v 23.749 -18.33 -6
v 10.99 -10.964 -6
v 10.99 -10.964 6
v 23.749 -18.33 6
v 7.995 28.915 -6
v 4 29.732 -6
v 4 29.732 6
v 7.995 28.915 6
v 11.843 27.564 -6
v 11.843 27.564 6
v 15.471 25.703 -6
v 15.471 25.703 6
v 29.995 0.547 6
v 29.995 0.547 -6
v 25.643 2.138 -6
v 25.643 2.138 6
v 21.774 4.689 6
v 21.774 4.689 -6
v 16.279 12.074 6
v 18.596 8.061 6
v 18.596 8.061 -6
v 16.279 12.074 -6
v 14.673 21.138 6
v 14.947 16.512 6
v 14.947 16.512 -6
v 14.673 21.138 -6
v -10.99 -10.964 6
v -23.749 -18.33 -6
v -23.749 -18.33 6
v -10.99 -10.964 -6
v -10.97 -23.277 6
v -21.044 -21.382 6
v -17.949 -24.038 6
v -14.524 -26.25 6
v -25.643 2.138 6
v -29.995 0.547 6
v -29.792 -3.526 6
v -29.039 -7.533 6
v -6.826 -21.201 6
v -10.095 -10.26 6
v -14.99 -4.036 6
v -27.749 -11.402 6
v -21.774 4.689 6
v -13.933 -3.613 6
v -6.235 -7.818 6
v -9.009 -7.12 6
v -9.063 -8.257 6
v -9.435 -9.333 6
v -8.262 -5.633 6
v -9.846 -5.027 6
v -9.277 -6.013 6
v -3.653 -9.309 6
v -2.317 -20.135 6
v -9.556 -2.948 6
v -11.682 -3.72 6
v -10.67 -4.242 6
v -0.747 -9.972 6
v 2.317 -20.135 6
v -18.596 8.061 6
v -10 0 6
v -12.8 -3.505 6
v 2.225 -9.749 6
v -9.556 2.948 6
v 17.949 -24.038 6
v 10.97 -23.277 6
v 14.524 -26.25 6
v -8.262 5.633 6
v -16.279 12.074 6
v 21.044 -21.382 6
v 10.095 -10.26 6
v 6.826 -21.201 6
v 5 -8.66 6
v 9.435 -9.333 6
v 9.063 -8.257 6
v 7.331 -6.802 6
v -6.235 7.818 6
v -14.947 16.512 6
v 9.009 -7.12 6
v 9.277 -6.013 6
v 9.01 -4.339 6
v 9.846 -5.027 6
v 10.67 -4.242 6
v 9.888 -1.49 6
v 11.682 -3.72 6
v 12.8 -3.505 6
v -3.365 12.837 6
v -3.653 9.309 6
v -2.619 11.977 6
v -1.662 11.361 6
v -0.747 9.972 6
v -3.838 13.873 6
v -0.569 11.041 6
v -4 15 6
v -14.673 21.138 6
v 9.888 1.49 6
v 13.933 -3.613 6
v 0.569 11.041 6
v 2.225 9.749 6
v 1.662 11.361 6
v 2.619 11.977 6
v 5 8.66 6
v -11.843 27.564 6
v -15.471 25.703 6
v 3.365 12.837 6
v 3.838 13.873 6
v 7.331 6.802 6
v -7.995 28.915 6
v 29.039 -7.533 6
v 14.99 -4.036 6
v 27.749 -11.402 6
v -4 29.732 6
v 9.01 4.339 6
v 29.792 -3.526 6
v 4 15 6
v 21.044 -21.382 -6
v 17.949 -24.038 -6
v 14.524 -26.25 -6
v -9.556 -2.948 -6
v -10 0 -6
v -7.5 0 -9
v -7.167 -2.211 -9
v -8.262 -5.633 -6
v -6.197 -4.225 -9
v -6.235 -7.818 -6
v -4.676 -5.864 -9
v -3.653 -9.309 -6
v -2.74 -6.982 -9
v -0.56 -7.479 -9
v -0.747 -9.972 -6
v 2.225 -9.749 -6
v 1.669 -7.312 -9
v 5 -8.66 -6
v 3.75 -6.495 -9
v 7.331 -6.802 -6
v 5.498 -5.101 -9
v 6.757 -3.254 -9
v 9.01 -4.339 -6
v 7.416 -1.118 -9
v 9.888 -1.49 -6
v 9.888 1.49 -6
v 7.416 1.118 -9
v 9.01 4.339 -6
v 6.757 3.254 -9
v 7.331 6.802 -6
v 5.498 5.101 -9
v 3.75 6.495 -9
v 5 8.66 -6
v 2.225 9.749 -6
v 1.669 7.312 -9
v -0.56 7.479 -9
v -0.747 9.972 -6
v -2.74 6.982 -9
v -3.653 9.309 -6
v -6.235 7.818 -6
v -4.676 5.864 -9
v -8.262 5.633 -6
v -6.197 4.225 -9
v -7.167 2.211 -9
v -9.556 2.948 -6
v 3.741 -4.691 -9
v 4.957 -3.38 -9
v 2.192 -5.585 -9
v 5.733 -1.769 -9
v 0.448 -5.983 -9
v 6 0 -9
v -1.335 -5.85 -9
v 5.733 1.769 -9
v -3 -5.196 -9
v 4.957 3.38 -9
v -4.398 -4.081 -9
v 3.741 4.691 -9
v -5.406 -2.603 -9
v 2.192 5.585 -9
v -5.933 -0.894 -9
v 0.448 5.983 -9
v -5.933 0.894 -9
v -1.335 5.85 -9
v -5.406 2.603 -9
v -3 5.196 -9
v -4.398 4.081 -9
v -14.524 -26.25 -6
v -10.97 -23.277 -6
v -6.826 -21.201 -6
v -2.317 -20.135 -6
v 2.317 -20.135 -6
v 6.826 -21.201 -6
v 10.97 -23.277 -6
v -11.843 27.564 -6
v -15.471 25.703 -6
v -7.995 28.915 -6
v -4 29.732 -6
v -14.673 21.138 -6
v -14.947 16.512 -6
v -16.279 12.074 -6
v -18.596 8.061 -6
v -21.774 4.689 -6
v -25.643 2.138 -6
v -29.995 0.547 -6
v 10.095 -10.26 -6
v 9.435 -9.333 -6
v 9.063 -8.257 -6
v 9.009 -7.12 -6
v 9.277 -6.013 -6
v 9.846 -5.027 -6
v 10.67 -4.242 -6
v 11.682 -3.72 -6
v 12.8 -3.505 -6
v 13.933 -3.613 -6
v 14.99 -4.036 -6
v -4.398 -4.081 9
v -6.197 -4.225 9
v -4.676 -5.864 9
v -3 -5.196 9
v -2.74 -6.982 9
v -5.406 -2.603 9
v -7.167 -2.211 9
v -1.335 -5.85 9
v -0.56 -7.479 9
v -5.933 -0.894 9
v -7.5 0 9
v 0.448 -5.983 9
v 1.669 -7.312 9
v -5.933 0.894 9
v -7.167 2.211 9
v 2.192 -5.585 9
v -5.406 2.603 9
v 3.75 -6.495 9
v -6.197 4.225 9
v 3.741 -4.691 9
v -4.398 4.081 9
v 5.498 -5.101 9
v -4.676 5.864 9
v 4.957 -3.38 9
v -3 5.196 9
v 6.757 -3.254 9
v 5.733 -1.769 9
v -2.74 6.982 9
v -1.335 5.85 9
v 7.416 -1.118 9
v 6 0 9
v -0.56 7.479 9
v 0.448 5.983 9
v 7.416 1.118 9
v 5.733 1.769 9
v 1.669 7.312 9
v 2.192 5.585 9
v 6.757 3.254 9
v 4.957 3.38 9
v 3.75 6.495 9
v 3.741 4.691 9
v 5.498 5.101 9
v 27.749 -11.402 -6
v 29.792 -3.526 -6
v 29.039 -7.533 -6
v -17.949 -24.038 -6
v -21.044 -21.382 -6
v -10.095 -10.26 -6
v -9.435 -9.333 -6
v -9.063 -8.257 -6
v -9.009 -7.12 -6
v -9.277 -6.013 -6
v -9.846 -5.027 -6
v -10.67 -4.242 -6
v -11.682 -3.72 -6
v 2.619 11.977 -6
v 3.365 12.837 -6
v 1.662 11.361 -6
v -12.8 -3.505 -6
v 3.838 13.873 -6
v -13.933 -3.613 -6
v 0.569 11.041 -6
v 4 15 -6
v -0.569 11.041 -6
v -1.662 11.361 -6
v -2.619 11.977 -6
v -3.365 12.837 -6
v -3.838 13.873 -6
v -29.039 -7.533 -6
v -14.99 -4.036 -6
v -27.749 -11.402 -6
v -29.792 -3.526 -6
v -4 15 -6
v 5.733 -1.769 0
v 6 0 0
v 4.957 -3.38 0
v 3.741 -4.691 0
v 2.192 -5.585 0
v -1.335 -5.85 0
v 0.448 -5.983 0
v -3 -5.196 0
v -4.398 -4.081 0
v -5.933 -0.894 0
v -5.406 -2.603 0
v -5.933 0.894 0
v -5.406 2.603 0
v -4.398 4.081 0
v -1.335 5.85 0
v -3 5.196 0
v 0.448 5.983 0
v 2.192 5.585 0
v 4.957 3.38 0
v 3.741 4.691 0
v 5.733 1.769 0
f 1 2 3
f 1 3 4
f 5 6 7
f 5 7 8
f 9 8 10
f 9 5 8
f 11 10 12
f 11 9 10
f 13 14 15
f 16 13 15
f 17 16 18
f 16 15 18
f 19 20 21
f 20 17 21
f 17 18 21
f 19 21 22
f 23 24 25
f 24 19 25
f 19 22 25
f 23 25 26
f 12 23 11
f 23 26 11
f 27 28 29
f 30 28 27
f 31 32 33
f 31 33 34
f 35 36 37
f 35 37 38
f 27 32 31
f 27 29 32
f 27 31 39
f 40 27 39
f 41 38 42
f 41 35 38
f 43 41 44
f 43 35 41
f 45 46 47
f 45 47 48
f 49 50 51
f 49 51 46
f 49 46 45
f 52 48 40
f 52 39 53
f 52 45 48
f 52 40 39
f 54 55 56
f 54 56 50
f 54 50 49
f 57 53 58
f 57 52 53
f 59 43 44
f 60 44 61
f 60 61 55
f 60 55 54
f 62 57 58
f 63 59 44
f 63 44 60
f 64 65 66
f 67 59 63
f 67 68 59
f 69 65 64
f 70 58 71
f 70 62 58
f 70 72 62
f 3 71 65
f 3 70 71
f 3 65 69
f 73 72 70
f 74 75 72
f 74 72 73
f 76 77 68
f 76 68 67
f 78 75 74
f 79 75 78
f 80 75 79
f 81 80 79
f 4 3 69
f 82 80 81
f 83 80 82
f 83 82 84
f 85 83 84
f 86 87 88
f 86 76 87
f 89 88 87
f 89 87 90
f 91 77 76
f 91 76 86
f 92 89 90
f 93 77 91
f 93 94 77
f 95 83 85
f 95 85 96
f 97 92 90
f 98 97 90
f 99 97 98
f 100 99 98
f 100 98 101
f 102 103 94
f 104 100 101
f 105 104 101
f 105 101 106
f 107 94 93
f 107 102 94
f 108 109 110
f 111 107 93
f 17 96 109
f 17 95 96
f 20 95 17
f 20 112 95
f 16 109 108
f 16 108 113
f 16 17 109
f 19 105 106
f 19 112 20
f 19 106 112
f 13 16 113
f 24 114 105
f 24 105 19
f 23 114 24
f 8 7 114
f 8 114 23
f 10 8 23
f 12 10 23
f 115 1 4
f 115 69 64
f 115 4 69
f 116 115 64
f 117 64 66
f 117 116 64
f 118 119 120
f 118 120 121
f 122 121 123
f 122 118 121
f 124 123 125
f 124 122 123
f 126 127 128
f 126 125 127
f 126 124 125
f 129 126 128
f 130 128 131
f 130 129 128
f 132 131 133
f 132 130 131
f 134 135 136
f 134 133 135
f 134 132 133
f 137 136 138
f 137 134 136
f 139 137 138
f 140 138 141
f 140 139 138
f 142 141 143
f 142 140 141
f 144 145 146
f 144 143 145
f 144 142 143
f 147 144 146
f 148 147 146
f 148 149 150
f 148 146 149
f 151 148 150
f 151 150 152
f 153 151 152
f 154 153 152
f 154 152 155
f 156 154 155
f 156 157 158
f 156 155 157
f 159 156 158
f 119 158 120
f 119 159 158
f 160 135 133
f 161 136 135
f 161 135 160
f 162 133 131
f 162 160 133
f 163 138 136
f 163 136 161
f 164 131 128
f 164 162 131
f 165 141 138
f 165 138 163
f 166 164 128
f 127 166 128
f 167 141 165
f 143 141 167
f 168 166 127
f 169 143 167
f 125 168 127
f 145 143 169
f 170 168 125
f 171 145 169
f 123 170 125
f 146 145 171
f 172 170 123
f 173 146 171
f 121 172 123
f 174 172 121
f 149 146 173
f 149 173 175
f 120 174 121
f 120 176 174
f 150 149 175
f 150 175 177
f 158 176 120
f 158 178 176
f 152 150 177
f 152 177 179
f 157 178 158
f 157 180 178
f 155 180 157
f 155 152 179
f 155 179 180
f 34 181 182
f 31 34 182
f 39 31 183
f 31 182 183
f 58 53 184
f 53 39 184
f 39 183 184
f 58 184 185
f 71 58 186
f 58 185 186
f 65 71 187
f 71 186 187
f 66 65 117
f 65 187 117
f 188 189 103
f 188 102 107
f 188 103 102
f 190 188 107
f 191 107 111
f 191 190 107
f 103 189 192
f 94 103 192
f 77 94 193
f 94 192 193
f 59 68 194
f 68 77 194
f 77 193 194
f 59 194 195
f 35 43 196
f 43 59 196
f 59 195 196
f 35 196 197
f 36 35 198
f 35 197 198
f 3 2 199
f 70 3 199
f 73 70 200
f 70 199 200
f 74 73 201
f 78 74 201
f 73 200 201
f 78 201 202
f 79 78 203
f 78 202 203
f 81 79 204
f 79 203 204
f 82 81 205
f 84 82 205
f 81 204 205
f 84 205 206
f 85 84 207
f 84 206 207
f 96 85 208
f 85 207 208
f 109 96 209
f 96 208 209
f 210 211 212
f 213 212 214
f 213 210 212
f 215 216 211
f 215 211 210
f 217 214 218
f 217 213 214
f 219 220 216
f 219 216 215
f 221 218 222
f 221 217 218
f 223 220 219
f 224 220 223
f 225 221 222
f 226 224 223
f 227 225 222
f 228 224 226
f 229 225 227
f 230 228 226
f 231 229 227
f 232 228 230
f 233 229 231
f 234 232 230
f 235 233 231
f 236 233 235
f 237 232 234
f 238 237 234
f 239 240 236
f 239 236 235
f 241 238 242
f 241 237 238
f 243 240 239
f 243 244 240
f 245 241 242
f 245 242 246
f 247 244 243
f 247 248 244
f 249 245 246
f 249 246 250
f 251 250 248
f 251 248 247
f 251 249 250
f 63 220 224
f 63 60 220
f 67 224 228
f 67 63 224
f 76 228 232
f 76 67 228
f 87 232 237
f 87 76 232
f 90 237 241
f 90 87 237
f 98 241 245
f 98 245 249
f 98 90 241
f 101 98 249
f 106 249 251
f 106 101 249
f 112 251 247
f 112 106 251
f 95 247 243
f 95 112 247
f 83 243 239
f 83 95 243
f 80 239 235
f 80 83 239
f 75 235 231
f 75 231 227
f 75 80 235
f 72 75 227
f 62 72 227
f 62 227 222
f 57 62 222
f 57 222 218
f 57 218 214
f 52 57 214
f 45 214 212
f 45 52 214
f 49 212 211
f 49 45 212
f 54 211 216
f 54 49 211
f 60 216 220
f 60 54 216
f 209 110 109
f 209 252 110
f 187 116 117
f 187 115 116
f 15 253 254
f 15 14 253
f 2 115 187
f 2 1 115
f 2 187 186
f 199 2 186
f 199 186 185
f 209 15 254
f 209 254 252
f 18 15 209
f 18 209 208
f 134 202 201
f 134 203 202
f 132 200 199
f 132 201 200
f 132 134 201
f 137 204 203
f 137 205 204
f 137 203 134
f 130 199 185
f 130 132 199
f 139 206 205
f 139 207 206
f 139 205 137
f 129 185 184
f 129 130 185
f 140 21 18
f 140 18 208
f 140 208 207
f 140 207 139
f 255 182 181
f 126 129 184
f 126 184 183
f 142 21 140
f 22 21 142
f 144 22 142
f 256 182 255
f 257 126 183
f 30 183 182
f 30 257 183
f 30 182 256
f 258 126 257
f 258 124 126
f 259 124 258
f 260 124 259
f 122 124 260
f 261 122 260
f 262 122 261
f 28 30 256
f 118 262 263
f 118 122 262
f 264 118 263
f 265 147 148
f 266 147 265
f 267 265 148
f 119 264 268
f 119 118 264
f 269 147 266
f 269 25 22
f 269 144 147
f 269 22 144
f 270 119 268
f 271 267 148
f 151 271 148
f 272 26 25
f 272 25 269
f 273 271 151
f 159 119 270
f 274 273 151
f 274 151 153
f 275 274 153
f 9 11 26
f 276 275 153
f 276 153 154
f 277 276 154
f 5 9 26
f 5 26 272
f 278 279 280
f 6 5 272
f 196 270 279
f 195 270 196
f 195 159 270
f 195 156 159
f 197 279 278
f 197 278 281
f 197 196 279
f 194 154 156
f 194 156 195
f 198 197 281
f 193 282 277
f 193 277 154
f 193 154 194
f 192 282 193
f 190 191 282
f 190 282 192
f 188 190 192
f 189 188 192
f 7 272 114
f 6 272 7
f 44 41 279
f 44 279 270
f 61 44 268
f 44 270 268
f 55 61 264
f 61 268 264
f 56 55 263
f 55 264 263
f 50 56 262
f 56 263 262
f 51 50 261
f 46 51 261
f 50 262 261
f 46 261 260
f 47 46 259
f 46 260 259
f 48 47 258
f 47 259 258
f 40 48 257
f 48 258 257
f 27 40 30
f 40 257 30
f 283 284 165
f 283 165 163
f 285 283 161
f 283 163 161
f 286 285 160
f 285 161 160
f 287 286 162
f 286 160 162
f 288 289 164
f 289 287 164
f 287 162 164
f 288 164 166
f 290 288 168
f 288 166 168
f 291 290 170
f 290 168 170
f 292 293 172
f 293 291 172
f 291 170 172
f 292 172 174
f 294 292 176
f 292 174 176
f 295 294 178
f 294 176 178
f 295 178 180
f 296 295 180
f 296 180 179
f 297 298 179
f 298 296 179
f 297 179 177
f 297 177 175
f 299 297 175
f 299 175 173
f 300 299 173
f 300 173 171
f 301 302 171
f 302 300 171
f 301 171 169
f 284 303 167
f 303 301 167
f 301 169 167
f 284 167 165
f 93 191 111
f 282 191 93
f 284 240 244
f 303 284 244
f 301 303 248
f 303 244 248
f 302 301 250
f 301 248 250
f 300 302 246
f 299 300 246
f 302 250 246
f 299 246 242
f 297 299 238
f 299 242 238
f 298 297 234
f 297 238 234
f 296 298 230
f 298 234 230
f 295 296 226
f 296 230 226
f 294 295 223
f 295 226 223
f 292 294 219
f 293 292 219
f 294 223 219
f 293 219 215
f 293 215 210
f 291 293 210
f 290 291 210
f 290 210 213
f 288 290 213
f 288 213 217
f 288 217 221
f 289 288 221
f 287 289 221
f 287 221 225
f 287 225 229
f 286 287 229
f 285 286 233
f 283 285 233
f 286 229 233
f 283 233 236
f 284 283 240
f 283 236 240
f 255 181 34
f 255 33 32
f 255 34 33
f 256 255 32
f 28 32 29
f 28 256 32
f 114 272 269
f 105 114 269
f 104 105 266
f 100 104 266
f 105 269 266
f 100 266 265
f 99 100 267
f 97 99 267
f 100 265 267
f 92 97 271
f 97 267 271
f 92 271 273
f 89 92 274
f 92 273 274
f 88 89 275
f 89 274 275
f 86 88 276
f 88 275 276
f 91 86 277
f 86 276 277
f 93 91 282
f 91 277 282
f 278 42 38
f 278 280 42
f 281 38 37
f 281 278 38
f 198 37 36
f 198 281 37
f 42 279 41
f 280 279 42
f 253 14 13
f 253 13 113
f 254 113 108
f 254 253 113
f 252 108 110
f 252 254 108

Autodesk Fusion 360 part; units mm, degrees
sketch "草图1" plane through (0, 0, 0) normal (0, 0, 1) x (1, 0, 0)
  line L0 (0, 100) -> (0, -123.0461) construction
  line L1 (-180, 0) -> (103.1908, 0) construction
  arc A0 (14.5237, -26.25) -> (-14.5237, -26.25) centre (0, -40) ccw
  line L2 (-4, 29.7321) -> (-4, 15)
  line L3 (4, 15) -> (4, 29.7321)
  arc A1 (-4, 15) -> (0, 11) centre (0, 15) ccw
  arc A2 (0, 11) -> (4, 15) centre (0, 15) ccw
  line L4 (-14.9904, -4.0359) -> (-27.7488, -11.402)
  line L5 (-23.7488, -18.3302) -> (-10.9904, -10.9641)
  arc A3 (-10.9904, -10.9641) -> (-9.5263, -5.5) centre (-12.9904, -7.5) ccw
  arc A4 (-9.5263, -5.5) -> (-14.9904, -4.0359) centre (-12.9904, -7.5) ccw
  arc A5 (15.4713, 25.7029) -> (29.995, 0.5471) centre (34.641, 20) ccw
  line L6 (10.9904, -10.9641) -> (23.7488, -18.3302)
  line L7 (27.7488, -11.402) -> (14.9904, -4.0359)
  arc A6 (14.9904, -4.0359) -> (9.5263, -5.5) centre (12.9904, -7.5) ccw
  arc A7 (9.5263, -5.5) -> (10.9904, -10.9641) centre (12.9904, -7.5) ccw
  arc A8 (-29.995, 0.5471) -> (-15.4713, 25.7029) centre (-34.641, 20) ccw
  arc A9 (15.4713, 25.7029) -> (4, 29.7321) centre (0, 0) ccw
  arc A10 (-4, 29.7321) -> (-15.4713, 25.7029) centre (0, 0) ccw
  arc A11 (27.7488, -11.402) -> (29.995, 0.5471) centre (0, 0) ccw
  arc A12 (14.5237, -26.25) -> (23.7488, -18.3302) centre (0, 0) ccw
  arc A13 (-29.995, 0.5471) -> (-27.7488, -11.402) centre (0, 0) ccw
  arc A14 (-23.7488, -18.3302) -> (-14.5237, -26.25) centre (0, 0) ccw
  circle A15 centre (0, 0) radius 7.5
  circle A16 centre (0, 0) radius 10
  point P0 (-4, 11)
  point P1 (4, 11)
  dimension "d2" = 20
  dimension "d3" = 40
  dimension "d4" = 60
  dimension "d6" = 8
  dimension "d8" = 4
  dimension "d10" = 360
  dimension "d11" = 15
  dimension "d12" = 20
extrude "拉伸1" add sketch "草图1" along normal blind 6 contours A0 L2 L3 A1 A2 L4 L5 A3 A4 A5 L6 L7 A6 A7 A8 A9 A10 A11 A12 A13 A14
sketch "草图2" plane through (0, 0, 0) normal (0, 0, 1) x (1, 0, 0)
  circle A0 centre (0, 0) radius 10
ref_plane "工作平面1" through (0, 0, 9) normal (0, 0, 1) x (1, 0, 0)
sketch "草图3" plane through (0, 0, 9) normal (0, 0, 1) x (1, 0, 0)
  circle A0 centre (0, 0) radius 7.5
  circle A1 centre (0, 0) radius 6
  dimension "d16" = 15
  dimension "d17" = 12
extrude "拉伸2" add sketch "草图2" along normal blind 6
sketch "草图4" plane through (0, 0, 6) normal (0, 0, 1) x (-1, 0, 0)
  line L0 (10.9904, 10.9641) -> (23.7488, 18.3302)
  arc A0 (23.7488, 18.3302) -> (14.5237, 26.25) centre (0, 0) ccw
  arc A1 (-14.5237, 26.25) -> (14.5237, 26.25) centre (0, 40) ccw
  arc A2 (-14.5237, 26.25) -> (-23.7488, 18.3302) centre (0, 0) ccw
  line L1 (-23.7488, 18.3302) -> (-10.9904, 10.9641)
  arc A3 (-14.9904, 4.0359) -> (-10.9904, 10.9641) centre (-12.9904, 7.5) ccw
  line L2 (-14.9904, 4.0359) -> (-27.7488, 11.402)
  arc A4 (-27.7488, 11.402) -> (-29.995, -0.5471) centre (0, 0) ccw
  arc A5 (-15.4713, -25.7029) -> (-29.995, -0.5471) centre (-34.641, -20) ccw
  arc A6 (-15.4713, -25.7029) -> (-4, -29.7321) centre (0, 0) ccw
  line L3 (-4, -29.7321) -> (-4, -15)
  arc A7 (4, -15) -> (-4, -15) centre (0, -15) ccw
  line L4 (4, -15) -> (4, -29.7321)
  arc A8 (4, -29.7321) -> (15.4713, -25.7029) centre (0, 0) ccw
  arc A9 (29.995, -0.5471) -> (15.4713, -25.7029) centre (34.641, -20) ccw
  arc A10 (29.995, -0.5471) -> (27.7488, 11.402) centre (0, 0) ccw
  line L5 (27.7488, 11.402) -> (14.9904, 4.0359)
  arc A11 (10.9904, 10.9641) -> (14.9904, 4.0359) centre (12.9904, 7.5) ccw
  circle A12 centre (0, 0) radius 10
loft "放样1" add profiles "草图4", "草图3" section 1 contours A12 section 2
extrude "拉伸3" cut sketch "草图3" against normal blind 21 contours A1
mirror "镜像1" about plane through (0, 0, 0) normal (0, 0, 1) of bodies 1 merged
